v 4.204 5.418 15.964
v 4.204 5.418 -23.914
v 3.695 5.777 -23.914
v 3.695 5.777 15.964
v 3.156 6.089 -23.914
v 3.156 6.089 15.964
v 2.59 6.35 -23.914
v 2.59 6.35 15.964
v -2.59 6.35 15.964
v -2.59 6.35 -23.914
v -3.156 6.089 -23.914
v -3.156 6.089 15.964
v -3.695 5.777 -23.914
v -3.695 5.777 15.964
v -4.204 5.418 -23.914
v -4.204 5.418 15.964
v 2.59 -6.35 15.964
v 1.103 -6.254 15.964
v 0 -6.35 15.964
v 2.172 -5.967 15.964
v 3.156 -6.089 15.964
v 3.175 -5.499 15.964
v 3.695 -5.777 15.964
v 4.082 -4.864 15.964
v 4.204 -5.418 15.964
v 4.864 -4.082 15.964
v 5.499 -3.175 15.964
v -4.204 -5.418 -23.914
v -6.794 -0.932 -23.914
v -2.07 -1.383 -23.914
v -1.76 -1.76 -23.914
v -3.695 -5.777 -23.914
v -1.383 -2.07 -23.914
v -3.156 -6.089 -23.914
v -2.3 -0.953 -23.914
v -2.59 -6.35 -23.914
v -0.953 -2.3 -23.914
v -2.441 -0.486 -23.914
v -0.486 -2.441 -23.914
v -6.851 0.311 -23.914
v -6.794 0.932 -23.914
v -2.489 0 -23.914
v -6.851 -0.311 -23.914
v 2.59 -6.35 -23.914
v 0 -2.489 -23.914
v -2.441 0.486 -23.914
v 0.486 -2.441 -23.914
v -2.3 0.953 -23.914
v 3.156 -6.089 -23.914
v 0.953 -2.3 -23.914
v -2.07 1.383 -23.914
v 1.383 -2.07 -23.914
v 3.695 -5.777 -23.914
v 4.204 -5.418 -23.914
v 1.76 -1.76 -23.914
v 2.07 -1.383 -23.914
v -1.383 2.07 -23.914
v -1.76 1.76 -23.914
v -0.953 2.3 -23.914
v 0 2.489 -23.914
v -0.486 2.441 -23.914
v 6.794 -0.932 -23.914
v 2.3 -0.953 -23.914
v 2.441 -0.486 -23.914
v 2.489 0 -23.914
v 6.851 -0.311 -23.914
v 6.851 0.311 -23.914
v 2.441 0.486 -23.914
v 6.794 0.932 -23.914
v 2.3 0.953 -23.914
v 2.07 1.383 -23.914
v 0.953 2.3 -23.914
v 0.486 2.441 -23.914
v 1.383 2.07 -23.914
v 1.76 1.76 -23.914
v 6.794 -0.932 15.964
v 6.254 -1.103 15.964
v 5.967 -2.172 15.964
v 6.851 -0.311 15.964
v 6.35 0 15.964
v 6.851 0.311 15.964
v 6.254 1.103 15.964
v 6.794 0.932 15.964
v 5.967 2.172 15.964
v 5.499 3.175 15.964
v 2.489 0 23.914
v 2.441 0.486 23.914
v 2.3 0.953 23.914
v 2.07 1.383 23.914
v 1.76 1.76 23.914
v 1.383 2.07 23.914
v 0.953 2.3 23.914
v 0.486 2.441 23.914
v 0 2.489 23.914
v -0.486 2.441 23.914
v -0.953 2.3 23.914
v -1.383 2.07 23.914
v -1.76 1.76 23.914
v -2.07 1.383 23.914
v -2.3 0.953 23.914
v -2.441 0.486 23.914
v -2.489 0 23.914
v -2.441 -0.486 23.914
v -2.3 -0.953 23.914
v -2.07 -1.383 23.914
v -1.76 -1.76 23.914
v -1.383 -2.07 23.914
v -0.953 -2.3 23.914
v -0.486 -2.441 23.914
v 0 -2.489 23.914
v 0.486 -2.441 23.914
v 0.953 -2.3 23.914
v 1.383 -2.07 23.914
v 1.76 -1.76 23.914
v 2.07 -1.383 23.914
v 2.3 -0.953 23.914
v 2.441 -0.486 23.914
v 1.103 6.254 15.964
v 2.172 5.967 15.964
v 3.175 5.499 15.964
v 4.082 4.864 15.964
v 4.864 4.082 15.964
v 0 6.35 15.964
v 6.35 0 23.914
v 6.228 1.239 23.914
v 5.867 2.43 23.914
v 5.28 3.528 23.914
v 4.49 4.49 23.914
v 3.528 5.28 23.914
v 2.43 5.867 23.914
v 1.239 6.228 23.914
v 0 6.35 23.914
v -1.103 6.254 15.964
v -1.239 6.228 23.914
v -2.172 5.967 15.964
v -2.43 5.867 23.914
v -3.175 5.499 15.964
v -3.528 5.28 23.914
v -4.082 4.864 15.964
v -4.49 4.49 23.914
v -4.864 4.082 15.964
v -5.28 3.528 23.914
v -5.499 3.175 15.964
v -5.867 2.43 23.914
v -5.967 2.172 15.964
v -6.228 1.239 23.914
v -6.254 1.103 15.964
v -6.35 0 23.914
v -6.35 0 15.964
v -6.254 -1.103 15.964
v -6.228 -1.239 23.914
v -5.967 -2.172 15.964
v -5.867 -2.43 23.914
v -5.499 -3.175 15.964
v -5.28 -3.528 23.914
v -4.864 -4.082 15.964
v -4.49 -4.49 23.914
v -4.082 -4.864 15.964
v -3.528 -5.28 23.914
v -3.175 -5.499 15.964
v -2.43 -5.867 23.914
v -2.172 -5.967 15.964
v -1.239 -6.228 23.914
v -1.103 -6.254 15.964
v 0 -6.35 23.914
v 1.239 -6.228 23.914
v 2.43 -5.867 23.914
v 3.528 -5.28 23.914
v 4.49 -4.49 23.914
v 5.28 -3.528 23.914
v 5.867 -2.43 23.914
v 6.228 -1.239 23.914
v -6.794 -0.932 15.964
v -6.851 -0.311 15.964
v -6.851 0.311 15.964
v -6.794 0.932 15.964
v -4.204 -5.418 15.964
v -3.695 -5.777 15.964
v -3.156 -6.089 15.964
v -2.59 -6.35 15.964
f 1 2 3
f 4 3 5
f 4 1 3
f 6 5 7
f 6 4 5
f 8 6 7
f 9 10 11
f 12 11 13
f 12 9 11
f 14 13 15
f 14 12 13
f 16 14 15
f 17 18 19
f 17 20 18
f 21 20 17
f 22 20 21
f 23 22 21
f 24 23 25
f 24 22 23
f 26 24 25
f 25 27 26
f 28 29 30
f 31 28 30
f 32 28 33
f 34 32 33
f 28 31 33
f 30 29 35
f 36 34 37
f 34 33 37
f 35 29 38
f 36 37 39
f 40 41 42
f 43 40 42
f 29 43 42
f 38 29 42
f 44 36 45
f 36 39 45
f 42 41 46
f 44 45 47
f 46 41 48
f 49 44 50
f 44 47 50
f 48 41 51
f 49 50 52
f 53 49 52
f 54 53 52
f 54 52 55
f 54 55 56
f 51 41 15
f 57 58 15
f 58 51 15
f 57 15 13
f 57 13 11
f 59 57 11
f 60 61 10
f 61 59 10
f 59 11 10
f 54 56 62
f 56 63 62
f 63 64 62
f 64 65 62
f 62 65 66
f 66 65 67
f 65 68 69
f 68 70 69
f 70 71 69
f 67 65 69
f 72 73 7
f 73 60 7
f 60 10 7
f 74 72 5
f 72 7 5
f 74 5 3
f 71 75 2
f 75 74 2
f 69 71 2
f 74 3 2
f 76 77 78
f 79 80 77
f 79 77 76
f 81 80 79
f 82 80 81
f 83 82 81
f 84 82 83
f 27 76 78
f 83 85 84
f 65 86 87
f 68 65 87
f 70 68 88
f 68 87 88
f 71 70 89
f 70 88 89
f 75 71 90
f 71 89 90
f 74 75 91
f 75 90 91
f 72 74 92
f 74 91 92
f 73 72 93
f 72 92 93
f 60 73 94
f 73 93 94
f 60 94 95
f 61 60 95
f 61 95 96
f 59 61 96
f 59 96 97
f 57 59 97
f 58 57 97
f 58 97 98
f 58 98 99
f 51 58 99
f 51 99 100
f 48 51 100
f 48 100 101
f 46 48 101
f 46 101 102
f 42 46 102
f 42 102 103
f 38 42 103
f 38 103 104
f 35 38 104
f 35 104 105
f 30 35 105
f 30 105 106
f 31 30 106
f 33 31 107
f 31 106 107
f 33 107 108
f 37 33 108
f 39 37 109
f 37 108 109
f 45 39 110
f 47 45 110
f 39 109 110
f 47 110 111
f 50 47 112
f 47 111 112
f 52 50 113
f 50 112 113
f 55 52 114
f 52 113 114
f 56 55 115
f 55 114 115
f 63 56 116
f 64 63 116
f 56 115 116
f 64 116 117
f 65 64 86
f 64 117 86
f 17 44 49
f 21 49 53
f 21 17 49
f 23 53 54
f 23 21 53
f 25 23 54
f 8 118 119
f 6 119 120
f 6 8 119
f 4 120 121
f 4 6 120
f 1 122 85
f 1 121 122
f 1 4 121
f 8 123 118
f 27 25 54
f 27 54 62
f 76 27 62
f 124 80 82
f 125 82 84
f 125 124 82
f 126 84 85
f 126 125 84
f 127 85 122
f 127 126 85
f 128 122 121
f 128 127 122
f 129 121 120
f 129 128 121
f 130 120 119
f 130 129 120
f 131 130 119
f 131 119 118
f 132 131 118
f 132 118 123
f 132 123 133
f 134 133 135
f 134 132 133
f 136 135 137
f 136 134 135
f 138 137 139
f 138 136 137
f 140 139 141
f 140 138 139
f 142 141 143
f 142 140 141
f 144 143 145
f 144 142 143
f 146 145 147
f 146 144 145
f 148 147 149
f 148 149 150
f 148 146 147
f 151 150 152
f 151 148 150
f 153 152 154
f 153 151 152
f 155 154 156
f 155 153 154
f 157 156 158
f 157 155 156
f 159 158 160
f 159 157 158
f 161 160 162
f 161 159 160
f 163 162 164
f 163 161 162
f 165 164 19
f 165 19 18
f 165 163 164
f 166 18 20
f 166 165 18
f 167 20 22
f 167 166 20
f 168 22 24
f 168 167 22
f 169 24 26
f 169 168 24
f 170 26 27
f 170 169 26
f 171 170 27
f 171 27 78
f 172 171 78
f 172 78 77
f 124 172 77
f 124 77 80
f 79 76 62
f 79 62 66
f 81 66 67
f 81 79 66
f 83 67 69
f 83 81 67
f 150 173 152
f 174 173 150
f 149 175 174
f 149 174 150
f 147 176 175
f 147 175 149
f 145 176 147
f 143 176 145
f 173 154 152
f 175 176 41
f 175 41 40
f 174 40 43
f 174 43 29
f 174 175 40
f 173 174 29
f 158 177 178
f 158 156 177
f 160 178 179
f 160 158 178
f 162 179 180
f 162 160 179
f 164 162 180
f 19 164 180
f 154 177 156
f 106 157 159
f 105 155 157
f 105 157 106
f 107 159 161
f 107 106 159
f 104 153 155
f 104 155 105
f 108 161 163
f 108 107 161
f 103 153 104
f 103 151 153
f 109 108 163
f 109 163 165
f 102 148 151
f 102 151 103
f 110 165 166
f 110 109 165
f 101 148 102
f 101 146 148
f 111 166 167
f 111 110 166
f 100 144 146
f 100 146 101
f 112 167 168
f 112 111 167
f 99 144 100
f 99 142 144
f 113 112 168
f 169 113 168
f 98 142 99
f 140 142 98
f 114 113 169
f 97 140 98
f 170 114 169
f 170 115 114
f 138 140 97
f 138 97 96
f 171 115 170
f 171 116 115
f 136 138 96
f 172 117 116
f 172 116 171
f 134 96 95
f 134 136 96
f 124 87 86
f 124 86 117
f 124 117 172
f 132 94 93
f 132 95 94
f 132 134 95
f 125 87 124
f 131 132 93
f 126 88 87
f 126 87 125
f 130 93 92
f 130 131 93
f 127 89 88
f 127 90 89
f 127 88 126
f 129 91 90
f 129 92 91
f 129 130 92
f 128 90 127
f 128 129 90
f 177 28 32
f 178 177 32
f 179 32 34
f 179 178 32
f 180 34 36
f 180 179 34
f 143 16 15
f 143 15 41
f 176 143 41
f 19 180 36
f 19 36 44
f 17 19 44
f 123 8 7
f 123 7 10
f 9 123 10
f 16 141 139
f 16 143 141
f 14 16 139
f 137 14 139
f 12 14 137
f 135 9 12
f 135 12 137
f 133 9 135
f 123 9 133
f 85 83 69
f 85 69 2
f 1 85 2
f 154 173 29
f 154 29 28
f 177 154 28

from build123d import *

# Parameters (mm, degrees)
BOSS_EXTRUDE1_DEPTH = 23.9141
SKETCH3_OUTSIDE_W   = 26.986
SKETCH3_OUTSIDE_H   = 25.022
SKETCH3_OUTSIDE_R   = 6.35
CUT_EXTRUDE2_DEPTH  = 7.9502
SKETCH4_OUTSIDE_W   = 26.986
SKETCH4_OUTSIDE_H   = 25.022
SKETCH4_OUTSIDE_R   = 6.858
CUT_EXTRUDE3_DEPTH  = 49.801870339
SKETCH5_R           = 2.4892
CUT_EXTRUDE4_DEPTH  = 49.732857286


with BuildPart() as part:
    # Sketch1 → Boss-Extrude1 (new, symmetric)
    with BuildSketch(Plane.XY):
        Polygon((7.332348419, 0), (3.666174209, 6.35), (-3.666174209, 6.35), (-7.332348419, 0), (-3.666174209, -6.35), (3.666174209, -6.35), align=None)
    extrude(amount=BOSS_EXTRUDE1_DEPTH, both=True)

    # Sketch3 outside → Cut-Extrude2 (cut)
    with BuildSketch(Plane.XY.offset(23.9141)):
        Rectangle(SKETCH3_OUTSIDE_W, SKETCH3_OUTSIDE_H)
        Circle(SKETCH3_OUTSIDE_R, mode=Mode.SUBTRACT)
    extrude(amount=-CUT_EXTRUDE2_DEPTH, mode=Mode.SUBTRACT)

    # Sketch4 outside → Cut-Extrude3 (cut, through all)
    with BuildSketch(Plane.XY.offset(23.9141)):
        Rectangle(SKETCH4_OUTSIDE_W, SKETCH4_OUTSIDE_H)
        Circle(SKETCH4_OUTSIDE_R, mode=Mode.SUBTRACT)
    extrude(amount=-CUT_EXTRUDE3_DEPTH, mode=Mode.SUBTRACT)

    # Sketch5 → Cut-Extrude4 (cut, through all)
    with BuildSketch(Plane.XY.offset(23.9141)):
        Circle(SKETCH5_R)
    extrude(amount=-CUT_EXTRUDE4_DEPTH, mode=Mode.SUBTRACT)


solid = part.part
